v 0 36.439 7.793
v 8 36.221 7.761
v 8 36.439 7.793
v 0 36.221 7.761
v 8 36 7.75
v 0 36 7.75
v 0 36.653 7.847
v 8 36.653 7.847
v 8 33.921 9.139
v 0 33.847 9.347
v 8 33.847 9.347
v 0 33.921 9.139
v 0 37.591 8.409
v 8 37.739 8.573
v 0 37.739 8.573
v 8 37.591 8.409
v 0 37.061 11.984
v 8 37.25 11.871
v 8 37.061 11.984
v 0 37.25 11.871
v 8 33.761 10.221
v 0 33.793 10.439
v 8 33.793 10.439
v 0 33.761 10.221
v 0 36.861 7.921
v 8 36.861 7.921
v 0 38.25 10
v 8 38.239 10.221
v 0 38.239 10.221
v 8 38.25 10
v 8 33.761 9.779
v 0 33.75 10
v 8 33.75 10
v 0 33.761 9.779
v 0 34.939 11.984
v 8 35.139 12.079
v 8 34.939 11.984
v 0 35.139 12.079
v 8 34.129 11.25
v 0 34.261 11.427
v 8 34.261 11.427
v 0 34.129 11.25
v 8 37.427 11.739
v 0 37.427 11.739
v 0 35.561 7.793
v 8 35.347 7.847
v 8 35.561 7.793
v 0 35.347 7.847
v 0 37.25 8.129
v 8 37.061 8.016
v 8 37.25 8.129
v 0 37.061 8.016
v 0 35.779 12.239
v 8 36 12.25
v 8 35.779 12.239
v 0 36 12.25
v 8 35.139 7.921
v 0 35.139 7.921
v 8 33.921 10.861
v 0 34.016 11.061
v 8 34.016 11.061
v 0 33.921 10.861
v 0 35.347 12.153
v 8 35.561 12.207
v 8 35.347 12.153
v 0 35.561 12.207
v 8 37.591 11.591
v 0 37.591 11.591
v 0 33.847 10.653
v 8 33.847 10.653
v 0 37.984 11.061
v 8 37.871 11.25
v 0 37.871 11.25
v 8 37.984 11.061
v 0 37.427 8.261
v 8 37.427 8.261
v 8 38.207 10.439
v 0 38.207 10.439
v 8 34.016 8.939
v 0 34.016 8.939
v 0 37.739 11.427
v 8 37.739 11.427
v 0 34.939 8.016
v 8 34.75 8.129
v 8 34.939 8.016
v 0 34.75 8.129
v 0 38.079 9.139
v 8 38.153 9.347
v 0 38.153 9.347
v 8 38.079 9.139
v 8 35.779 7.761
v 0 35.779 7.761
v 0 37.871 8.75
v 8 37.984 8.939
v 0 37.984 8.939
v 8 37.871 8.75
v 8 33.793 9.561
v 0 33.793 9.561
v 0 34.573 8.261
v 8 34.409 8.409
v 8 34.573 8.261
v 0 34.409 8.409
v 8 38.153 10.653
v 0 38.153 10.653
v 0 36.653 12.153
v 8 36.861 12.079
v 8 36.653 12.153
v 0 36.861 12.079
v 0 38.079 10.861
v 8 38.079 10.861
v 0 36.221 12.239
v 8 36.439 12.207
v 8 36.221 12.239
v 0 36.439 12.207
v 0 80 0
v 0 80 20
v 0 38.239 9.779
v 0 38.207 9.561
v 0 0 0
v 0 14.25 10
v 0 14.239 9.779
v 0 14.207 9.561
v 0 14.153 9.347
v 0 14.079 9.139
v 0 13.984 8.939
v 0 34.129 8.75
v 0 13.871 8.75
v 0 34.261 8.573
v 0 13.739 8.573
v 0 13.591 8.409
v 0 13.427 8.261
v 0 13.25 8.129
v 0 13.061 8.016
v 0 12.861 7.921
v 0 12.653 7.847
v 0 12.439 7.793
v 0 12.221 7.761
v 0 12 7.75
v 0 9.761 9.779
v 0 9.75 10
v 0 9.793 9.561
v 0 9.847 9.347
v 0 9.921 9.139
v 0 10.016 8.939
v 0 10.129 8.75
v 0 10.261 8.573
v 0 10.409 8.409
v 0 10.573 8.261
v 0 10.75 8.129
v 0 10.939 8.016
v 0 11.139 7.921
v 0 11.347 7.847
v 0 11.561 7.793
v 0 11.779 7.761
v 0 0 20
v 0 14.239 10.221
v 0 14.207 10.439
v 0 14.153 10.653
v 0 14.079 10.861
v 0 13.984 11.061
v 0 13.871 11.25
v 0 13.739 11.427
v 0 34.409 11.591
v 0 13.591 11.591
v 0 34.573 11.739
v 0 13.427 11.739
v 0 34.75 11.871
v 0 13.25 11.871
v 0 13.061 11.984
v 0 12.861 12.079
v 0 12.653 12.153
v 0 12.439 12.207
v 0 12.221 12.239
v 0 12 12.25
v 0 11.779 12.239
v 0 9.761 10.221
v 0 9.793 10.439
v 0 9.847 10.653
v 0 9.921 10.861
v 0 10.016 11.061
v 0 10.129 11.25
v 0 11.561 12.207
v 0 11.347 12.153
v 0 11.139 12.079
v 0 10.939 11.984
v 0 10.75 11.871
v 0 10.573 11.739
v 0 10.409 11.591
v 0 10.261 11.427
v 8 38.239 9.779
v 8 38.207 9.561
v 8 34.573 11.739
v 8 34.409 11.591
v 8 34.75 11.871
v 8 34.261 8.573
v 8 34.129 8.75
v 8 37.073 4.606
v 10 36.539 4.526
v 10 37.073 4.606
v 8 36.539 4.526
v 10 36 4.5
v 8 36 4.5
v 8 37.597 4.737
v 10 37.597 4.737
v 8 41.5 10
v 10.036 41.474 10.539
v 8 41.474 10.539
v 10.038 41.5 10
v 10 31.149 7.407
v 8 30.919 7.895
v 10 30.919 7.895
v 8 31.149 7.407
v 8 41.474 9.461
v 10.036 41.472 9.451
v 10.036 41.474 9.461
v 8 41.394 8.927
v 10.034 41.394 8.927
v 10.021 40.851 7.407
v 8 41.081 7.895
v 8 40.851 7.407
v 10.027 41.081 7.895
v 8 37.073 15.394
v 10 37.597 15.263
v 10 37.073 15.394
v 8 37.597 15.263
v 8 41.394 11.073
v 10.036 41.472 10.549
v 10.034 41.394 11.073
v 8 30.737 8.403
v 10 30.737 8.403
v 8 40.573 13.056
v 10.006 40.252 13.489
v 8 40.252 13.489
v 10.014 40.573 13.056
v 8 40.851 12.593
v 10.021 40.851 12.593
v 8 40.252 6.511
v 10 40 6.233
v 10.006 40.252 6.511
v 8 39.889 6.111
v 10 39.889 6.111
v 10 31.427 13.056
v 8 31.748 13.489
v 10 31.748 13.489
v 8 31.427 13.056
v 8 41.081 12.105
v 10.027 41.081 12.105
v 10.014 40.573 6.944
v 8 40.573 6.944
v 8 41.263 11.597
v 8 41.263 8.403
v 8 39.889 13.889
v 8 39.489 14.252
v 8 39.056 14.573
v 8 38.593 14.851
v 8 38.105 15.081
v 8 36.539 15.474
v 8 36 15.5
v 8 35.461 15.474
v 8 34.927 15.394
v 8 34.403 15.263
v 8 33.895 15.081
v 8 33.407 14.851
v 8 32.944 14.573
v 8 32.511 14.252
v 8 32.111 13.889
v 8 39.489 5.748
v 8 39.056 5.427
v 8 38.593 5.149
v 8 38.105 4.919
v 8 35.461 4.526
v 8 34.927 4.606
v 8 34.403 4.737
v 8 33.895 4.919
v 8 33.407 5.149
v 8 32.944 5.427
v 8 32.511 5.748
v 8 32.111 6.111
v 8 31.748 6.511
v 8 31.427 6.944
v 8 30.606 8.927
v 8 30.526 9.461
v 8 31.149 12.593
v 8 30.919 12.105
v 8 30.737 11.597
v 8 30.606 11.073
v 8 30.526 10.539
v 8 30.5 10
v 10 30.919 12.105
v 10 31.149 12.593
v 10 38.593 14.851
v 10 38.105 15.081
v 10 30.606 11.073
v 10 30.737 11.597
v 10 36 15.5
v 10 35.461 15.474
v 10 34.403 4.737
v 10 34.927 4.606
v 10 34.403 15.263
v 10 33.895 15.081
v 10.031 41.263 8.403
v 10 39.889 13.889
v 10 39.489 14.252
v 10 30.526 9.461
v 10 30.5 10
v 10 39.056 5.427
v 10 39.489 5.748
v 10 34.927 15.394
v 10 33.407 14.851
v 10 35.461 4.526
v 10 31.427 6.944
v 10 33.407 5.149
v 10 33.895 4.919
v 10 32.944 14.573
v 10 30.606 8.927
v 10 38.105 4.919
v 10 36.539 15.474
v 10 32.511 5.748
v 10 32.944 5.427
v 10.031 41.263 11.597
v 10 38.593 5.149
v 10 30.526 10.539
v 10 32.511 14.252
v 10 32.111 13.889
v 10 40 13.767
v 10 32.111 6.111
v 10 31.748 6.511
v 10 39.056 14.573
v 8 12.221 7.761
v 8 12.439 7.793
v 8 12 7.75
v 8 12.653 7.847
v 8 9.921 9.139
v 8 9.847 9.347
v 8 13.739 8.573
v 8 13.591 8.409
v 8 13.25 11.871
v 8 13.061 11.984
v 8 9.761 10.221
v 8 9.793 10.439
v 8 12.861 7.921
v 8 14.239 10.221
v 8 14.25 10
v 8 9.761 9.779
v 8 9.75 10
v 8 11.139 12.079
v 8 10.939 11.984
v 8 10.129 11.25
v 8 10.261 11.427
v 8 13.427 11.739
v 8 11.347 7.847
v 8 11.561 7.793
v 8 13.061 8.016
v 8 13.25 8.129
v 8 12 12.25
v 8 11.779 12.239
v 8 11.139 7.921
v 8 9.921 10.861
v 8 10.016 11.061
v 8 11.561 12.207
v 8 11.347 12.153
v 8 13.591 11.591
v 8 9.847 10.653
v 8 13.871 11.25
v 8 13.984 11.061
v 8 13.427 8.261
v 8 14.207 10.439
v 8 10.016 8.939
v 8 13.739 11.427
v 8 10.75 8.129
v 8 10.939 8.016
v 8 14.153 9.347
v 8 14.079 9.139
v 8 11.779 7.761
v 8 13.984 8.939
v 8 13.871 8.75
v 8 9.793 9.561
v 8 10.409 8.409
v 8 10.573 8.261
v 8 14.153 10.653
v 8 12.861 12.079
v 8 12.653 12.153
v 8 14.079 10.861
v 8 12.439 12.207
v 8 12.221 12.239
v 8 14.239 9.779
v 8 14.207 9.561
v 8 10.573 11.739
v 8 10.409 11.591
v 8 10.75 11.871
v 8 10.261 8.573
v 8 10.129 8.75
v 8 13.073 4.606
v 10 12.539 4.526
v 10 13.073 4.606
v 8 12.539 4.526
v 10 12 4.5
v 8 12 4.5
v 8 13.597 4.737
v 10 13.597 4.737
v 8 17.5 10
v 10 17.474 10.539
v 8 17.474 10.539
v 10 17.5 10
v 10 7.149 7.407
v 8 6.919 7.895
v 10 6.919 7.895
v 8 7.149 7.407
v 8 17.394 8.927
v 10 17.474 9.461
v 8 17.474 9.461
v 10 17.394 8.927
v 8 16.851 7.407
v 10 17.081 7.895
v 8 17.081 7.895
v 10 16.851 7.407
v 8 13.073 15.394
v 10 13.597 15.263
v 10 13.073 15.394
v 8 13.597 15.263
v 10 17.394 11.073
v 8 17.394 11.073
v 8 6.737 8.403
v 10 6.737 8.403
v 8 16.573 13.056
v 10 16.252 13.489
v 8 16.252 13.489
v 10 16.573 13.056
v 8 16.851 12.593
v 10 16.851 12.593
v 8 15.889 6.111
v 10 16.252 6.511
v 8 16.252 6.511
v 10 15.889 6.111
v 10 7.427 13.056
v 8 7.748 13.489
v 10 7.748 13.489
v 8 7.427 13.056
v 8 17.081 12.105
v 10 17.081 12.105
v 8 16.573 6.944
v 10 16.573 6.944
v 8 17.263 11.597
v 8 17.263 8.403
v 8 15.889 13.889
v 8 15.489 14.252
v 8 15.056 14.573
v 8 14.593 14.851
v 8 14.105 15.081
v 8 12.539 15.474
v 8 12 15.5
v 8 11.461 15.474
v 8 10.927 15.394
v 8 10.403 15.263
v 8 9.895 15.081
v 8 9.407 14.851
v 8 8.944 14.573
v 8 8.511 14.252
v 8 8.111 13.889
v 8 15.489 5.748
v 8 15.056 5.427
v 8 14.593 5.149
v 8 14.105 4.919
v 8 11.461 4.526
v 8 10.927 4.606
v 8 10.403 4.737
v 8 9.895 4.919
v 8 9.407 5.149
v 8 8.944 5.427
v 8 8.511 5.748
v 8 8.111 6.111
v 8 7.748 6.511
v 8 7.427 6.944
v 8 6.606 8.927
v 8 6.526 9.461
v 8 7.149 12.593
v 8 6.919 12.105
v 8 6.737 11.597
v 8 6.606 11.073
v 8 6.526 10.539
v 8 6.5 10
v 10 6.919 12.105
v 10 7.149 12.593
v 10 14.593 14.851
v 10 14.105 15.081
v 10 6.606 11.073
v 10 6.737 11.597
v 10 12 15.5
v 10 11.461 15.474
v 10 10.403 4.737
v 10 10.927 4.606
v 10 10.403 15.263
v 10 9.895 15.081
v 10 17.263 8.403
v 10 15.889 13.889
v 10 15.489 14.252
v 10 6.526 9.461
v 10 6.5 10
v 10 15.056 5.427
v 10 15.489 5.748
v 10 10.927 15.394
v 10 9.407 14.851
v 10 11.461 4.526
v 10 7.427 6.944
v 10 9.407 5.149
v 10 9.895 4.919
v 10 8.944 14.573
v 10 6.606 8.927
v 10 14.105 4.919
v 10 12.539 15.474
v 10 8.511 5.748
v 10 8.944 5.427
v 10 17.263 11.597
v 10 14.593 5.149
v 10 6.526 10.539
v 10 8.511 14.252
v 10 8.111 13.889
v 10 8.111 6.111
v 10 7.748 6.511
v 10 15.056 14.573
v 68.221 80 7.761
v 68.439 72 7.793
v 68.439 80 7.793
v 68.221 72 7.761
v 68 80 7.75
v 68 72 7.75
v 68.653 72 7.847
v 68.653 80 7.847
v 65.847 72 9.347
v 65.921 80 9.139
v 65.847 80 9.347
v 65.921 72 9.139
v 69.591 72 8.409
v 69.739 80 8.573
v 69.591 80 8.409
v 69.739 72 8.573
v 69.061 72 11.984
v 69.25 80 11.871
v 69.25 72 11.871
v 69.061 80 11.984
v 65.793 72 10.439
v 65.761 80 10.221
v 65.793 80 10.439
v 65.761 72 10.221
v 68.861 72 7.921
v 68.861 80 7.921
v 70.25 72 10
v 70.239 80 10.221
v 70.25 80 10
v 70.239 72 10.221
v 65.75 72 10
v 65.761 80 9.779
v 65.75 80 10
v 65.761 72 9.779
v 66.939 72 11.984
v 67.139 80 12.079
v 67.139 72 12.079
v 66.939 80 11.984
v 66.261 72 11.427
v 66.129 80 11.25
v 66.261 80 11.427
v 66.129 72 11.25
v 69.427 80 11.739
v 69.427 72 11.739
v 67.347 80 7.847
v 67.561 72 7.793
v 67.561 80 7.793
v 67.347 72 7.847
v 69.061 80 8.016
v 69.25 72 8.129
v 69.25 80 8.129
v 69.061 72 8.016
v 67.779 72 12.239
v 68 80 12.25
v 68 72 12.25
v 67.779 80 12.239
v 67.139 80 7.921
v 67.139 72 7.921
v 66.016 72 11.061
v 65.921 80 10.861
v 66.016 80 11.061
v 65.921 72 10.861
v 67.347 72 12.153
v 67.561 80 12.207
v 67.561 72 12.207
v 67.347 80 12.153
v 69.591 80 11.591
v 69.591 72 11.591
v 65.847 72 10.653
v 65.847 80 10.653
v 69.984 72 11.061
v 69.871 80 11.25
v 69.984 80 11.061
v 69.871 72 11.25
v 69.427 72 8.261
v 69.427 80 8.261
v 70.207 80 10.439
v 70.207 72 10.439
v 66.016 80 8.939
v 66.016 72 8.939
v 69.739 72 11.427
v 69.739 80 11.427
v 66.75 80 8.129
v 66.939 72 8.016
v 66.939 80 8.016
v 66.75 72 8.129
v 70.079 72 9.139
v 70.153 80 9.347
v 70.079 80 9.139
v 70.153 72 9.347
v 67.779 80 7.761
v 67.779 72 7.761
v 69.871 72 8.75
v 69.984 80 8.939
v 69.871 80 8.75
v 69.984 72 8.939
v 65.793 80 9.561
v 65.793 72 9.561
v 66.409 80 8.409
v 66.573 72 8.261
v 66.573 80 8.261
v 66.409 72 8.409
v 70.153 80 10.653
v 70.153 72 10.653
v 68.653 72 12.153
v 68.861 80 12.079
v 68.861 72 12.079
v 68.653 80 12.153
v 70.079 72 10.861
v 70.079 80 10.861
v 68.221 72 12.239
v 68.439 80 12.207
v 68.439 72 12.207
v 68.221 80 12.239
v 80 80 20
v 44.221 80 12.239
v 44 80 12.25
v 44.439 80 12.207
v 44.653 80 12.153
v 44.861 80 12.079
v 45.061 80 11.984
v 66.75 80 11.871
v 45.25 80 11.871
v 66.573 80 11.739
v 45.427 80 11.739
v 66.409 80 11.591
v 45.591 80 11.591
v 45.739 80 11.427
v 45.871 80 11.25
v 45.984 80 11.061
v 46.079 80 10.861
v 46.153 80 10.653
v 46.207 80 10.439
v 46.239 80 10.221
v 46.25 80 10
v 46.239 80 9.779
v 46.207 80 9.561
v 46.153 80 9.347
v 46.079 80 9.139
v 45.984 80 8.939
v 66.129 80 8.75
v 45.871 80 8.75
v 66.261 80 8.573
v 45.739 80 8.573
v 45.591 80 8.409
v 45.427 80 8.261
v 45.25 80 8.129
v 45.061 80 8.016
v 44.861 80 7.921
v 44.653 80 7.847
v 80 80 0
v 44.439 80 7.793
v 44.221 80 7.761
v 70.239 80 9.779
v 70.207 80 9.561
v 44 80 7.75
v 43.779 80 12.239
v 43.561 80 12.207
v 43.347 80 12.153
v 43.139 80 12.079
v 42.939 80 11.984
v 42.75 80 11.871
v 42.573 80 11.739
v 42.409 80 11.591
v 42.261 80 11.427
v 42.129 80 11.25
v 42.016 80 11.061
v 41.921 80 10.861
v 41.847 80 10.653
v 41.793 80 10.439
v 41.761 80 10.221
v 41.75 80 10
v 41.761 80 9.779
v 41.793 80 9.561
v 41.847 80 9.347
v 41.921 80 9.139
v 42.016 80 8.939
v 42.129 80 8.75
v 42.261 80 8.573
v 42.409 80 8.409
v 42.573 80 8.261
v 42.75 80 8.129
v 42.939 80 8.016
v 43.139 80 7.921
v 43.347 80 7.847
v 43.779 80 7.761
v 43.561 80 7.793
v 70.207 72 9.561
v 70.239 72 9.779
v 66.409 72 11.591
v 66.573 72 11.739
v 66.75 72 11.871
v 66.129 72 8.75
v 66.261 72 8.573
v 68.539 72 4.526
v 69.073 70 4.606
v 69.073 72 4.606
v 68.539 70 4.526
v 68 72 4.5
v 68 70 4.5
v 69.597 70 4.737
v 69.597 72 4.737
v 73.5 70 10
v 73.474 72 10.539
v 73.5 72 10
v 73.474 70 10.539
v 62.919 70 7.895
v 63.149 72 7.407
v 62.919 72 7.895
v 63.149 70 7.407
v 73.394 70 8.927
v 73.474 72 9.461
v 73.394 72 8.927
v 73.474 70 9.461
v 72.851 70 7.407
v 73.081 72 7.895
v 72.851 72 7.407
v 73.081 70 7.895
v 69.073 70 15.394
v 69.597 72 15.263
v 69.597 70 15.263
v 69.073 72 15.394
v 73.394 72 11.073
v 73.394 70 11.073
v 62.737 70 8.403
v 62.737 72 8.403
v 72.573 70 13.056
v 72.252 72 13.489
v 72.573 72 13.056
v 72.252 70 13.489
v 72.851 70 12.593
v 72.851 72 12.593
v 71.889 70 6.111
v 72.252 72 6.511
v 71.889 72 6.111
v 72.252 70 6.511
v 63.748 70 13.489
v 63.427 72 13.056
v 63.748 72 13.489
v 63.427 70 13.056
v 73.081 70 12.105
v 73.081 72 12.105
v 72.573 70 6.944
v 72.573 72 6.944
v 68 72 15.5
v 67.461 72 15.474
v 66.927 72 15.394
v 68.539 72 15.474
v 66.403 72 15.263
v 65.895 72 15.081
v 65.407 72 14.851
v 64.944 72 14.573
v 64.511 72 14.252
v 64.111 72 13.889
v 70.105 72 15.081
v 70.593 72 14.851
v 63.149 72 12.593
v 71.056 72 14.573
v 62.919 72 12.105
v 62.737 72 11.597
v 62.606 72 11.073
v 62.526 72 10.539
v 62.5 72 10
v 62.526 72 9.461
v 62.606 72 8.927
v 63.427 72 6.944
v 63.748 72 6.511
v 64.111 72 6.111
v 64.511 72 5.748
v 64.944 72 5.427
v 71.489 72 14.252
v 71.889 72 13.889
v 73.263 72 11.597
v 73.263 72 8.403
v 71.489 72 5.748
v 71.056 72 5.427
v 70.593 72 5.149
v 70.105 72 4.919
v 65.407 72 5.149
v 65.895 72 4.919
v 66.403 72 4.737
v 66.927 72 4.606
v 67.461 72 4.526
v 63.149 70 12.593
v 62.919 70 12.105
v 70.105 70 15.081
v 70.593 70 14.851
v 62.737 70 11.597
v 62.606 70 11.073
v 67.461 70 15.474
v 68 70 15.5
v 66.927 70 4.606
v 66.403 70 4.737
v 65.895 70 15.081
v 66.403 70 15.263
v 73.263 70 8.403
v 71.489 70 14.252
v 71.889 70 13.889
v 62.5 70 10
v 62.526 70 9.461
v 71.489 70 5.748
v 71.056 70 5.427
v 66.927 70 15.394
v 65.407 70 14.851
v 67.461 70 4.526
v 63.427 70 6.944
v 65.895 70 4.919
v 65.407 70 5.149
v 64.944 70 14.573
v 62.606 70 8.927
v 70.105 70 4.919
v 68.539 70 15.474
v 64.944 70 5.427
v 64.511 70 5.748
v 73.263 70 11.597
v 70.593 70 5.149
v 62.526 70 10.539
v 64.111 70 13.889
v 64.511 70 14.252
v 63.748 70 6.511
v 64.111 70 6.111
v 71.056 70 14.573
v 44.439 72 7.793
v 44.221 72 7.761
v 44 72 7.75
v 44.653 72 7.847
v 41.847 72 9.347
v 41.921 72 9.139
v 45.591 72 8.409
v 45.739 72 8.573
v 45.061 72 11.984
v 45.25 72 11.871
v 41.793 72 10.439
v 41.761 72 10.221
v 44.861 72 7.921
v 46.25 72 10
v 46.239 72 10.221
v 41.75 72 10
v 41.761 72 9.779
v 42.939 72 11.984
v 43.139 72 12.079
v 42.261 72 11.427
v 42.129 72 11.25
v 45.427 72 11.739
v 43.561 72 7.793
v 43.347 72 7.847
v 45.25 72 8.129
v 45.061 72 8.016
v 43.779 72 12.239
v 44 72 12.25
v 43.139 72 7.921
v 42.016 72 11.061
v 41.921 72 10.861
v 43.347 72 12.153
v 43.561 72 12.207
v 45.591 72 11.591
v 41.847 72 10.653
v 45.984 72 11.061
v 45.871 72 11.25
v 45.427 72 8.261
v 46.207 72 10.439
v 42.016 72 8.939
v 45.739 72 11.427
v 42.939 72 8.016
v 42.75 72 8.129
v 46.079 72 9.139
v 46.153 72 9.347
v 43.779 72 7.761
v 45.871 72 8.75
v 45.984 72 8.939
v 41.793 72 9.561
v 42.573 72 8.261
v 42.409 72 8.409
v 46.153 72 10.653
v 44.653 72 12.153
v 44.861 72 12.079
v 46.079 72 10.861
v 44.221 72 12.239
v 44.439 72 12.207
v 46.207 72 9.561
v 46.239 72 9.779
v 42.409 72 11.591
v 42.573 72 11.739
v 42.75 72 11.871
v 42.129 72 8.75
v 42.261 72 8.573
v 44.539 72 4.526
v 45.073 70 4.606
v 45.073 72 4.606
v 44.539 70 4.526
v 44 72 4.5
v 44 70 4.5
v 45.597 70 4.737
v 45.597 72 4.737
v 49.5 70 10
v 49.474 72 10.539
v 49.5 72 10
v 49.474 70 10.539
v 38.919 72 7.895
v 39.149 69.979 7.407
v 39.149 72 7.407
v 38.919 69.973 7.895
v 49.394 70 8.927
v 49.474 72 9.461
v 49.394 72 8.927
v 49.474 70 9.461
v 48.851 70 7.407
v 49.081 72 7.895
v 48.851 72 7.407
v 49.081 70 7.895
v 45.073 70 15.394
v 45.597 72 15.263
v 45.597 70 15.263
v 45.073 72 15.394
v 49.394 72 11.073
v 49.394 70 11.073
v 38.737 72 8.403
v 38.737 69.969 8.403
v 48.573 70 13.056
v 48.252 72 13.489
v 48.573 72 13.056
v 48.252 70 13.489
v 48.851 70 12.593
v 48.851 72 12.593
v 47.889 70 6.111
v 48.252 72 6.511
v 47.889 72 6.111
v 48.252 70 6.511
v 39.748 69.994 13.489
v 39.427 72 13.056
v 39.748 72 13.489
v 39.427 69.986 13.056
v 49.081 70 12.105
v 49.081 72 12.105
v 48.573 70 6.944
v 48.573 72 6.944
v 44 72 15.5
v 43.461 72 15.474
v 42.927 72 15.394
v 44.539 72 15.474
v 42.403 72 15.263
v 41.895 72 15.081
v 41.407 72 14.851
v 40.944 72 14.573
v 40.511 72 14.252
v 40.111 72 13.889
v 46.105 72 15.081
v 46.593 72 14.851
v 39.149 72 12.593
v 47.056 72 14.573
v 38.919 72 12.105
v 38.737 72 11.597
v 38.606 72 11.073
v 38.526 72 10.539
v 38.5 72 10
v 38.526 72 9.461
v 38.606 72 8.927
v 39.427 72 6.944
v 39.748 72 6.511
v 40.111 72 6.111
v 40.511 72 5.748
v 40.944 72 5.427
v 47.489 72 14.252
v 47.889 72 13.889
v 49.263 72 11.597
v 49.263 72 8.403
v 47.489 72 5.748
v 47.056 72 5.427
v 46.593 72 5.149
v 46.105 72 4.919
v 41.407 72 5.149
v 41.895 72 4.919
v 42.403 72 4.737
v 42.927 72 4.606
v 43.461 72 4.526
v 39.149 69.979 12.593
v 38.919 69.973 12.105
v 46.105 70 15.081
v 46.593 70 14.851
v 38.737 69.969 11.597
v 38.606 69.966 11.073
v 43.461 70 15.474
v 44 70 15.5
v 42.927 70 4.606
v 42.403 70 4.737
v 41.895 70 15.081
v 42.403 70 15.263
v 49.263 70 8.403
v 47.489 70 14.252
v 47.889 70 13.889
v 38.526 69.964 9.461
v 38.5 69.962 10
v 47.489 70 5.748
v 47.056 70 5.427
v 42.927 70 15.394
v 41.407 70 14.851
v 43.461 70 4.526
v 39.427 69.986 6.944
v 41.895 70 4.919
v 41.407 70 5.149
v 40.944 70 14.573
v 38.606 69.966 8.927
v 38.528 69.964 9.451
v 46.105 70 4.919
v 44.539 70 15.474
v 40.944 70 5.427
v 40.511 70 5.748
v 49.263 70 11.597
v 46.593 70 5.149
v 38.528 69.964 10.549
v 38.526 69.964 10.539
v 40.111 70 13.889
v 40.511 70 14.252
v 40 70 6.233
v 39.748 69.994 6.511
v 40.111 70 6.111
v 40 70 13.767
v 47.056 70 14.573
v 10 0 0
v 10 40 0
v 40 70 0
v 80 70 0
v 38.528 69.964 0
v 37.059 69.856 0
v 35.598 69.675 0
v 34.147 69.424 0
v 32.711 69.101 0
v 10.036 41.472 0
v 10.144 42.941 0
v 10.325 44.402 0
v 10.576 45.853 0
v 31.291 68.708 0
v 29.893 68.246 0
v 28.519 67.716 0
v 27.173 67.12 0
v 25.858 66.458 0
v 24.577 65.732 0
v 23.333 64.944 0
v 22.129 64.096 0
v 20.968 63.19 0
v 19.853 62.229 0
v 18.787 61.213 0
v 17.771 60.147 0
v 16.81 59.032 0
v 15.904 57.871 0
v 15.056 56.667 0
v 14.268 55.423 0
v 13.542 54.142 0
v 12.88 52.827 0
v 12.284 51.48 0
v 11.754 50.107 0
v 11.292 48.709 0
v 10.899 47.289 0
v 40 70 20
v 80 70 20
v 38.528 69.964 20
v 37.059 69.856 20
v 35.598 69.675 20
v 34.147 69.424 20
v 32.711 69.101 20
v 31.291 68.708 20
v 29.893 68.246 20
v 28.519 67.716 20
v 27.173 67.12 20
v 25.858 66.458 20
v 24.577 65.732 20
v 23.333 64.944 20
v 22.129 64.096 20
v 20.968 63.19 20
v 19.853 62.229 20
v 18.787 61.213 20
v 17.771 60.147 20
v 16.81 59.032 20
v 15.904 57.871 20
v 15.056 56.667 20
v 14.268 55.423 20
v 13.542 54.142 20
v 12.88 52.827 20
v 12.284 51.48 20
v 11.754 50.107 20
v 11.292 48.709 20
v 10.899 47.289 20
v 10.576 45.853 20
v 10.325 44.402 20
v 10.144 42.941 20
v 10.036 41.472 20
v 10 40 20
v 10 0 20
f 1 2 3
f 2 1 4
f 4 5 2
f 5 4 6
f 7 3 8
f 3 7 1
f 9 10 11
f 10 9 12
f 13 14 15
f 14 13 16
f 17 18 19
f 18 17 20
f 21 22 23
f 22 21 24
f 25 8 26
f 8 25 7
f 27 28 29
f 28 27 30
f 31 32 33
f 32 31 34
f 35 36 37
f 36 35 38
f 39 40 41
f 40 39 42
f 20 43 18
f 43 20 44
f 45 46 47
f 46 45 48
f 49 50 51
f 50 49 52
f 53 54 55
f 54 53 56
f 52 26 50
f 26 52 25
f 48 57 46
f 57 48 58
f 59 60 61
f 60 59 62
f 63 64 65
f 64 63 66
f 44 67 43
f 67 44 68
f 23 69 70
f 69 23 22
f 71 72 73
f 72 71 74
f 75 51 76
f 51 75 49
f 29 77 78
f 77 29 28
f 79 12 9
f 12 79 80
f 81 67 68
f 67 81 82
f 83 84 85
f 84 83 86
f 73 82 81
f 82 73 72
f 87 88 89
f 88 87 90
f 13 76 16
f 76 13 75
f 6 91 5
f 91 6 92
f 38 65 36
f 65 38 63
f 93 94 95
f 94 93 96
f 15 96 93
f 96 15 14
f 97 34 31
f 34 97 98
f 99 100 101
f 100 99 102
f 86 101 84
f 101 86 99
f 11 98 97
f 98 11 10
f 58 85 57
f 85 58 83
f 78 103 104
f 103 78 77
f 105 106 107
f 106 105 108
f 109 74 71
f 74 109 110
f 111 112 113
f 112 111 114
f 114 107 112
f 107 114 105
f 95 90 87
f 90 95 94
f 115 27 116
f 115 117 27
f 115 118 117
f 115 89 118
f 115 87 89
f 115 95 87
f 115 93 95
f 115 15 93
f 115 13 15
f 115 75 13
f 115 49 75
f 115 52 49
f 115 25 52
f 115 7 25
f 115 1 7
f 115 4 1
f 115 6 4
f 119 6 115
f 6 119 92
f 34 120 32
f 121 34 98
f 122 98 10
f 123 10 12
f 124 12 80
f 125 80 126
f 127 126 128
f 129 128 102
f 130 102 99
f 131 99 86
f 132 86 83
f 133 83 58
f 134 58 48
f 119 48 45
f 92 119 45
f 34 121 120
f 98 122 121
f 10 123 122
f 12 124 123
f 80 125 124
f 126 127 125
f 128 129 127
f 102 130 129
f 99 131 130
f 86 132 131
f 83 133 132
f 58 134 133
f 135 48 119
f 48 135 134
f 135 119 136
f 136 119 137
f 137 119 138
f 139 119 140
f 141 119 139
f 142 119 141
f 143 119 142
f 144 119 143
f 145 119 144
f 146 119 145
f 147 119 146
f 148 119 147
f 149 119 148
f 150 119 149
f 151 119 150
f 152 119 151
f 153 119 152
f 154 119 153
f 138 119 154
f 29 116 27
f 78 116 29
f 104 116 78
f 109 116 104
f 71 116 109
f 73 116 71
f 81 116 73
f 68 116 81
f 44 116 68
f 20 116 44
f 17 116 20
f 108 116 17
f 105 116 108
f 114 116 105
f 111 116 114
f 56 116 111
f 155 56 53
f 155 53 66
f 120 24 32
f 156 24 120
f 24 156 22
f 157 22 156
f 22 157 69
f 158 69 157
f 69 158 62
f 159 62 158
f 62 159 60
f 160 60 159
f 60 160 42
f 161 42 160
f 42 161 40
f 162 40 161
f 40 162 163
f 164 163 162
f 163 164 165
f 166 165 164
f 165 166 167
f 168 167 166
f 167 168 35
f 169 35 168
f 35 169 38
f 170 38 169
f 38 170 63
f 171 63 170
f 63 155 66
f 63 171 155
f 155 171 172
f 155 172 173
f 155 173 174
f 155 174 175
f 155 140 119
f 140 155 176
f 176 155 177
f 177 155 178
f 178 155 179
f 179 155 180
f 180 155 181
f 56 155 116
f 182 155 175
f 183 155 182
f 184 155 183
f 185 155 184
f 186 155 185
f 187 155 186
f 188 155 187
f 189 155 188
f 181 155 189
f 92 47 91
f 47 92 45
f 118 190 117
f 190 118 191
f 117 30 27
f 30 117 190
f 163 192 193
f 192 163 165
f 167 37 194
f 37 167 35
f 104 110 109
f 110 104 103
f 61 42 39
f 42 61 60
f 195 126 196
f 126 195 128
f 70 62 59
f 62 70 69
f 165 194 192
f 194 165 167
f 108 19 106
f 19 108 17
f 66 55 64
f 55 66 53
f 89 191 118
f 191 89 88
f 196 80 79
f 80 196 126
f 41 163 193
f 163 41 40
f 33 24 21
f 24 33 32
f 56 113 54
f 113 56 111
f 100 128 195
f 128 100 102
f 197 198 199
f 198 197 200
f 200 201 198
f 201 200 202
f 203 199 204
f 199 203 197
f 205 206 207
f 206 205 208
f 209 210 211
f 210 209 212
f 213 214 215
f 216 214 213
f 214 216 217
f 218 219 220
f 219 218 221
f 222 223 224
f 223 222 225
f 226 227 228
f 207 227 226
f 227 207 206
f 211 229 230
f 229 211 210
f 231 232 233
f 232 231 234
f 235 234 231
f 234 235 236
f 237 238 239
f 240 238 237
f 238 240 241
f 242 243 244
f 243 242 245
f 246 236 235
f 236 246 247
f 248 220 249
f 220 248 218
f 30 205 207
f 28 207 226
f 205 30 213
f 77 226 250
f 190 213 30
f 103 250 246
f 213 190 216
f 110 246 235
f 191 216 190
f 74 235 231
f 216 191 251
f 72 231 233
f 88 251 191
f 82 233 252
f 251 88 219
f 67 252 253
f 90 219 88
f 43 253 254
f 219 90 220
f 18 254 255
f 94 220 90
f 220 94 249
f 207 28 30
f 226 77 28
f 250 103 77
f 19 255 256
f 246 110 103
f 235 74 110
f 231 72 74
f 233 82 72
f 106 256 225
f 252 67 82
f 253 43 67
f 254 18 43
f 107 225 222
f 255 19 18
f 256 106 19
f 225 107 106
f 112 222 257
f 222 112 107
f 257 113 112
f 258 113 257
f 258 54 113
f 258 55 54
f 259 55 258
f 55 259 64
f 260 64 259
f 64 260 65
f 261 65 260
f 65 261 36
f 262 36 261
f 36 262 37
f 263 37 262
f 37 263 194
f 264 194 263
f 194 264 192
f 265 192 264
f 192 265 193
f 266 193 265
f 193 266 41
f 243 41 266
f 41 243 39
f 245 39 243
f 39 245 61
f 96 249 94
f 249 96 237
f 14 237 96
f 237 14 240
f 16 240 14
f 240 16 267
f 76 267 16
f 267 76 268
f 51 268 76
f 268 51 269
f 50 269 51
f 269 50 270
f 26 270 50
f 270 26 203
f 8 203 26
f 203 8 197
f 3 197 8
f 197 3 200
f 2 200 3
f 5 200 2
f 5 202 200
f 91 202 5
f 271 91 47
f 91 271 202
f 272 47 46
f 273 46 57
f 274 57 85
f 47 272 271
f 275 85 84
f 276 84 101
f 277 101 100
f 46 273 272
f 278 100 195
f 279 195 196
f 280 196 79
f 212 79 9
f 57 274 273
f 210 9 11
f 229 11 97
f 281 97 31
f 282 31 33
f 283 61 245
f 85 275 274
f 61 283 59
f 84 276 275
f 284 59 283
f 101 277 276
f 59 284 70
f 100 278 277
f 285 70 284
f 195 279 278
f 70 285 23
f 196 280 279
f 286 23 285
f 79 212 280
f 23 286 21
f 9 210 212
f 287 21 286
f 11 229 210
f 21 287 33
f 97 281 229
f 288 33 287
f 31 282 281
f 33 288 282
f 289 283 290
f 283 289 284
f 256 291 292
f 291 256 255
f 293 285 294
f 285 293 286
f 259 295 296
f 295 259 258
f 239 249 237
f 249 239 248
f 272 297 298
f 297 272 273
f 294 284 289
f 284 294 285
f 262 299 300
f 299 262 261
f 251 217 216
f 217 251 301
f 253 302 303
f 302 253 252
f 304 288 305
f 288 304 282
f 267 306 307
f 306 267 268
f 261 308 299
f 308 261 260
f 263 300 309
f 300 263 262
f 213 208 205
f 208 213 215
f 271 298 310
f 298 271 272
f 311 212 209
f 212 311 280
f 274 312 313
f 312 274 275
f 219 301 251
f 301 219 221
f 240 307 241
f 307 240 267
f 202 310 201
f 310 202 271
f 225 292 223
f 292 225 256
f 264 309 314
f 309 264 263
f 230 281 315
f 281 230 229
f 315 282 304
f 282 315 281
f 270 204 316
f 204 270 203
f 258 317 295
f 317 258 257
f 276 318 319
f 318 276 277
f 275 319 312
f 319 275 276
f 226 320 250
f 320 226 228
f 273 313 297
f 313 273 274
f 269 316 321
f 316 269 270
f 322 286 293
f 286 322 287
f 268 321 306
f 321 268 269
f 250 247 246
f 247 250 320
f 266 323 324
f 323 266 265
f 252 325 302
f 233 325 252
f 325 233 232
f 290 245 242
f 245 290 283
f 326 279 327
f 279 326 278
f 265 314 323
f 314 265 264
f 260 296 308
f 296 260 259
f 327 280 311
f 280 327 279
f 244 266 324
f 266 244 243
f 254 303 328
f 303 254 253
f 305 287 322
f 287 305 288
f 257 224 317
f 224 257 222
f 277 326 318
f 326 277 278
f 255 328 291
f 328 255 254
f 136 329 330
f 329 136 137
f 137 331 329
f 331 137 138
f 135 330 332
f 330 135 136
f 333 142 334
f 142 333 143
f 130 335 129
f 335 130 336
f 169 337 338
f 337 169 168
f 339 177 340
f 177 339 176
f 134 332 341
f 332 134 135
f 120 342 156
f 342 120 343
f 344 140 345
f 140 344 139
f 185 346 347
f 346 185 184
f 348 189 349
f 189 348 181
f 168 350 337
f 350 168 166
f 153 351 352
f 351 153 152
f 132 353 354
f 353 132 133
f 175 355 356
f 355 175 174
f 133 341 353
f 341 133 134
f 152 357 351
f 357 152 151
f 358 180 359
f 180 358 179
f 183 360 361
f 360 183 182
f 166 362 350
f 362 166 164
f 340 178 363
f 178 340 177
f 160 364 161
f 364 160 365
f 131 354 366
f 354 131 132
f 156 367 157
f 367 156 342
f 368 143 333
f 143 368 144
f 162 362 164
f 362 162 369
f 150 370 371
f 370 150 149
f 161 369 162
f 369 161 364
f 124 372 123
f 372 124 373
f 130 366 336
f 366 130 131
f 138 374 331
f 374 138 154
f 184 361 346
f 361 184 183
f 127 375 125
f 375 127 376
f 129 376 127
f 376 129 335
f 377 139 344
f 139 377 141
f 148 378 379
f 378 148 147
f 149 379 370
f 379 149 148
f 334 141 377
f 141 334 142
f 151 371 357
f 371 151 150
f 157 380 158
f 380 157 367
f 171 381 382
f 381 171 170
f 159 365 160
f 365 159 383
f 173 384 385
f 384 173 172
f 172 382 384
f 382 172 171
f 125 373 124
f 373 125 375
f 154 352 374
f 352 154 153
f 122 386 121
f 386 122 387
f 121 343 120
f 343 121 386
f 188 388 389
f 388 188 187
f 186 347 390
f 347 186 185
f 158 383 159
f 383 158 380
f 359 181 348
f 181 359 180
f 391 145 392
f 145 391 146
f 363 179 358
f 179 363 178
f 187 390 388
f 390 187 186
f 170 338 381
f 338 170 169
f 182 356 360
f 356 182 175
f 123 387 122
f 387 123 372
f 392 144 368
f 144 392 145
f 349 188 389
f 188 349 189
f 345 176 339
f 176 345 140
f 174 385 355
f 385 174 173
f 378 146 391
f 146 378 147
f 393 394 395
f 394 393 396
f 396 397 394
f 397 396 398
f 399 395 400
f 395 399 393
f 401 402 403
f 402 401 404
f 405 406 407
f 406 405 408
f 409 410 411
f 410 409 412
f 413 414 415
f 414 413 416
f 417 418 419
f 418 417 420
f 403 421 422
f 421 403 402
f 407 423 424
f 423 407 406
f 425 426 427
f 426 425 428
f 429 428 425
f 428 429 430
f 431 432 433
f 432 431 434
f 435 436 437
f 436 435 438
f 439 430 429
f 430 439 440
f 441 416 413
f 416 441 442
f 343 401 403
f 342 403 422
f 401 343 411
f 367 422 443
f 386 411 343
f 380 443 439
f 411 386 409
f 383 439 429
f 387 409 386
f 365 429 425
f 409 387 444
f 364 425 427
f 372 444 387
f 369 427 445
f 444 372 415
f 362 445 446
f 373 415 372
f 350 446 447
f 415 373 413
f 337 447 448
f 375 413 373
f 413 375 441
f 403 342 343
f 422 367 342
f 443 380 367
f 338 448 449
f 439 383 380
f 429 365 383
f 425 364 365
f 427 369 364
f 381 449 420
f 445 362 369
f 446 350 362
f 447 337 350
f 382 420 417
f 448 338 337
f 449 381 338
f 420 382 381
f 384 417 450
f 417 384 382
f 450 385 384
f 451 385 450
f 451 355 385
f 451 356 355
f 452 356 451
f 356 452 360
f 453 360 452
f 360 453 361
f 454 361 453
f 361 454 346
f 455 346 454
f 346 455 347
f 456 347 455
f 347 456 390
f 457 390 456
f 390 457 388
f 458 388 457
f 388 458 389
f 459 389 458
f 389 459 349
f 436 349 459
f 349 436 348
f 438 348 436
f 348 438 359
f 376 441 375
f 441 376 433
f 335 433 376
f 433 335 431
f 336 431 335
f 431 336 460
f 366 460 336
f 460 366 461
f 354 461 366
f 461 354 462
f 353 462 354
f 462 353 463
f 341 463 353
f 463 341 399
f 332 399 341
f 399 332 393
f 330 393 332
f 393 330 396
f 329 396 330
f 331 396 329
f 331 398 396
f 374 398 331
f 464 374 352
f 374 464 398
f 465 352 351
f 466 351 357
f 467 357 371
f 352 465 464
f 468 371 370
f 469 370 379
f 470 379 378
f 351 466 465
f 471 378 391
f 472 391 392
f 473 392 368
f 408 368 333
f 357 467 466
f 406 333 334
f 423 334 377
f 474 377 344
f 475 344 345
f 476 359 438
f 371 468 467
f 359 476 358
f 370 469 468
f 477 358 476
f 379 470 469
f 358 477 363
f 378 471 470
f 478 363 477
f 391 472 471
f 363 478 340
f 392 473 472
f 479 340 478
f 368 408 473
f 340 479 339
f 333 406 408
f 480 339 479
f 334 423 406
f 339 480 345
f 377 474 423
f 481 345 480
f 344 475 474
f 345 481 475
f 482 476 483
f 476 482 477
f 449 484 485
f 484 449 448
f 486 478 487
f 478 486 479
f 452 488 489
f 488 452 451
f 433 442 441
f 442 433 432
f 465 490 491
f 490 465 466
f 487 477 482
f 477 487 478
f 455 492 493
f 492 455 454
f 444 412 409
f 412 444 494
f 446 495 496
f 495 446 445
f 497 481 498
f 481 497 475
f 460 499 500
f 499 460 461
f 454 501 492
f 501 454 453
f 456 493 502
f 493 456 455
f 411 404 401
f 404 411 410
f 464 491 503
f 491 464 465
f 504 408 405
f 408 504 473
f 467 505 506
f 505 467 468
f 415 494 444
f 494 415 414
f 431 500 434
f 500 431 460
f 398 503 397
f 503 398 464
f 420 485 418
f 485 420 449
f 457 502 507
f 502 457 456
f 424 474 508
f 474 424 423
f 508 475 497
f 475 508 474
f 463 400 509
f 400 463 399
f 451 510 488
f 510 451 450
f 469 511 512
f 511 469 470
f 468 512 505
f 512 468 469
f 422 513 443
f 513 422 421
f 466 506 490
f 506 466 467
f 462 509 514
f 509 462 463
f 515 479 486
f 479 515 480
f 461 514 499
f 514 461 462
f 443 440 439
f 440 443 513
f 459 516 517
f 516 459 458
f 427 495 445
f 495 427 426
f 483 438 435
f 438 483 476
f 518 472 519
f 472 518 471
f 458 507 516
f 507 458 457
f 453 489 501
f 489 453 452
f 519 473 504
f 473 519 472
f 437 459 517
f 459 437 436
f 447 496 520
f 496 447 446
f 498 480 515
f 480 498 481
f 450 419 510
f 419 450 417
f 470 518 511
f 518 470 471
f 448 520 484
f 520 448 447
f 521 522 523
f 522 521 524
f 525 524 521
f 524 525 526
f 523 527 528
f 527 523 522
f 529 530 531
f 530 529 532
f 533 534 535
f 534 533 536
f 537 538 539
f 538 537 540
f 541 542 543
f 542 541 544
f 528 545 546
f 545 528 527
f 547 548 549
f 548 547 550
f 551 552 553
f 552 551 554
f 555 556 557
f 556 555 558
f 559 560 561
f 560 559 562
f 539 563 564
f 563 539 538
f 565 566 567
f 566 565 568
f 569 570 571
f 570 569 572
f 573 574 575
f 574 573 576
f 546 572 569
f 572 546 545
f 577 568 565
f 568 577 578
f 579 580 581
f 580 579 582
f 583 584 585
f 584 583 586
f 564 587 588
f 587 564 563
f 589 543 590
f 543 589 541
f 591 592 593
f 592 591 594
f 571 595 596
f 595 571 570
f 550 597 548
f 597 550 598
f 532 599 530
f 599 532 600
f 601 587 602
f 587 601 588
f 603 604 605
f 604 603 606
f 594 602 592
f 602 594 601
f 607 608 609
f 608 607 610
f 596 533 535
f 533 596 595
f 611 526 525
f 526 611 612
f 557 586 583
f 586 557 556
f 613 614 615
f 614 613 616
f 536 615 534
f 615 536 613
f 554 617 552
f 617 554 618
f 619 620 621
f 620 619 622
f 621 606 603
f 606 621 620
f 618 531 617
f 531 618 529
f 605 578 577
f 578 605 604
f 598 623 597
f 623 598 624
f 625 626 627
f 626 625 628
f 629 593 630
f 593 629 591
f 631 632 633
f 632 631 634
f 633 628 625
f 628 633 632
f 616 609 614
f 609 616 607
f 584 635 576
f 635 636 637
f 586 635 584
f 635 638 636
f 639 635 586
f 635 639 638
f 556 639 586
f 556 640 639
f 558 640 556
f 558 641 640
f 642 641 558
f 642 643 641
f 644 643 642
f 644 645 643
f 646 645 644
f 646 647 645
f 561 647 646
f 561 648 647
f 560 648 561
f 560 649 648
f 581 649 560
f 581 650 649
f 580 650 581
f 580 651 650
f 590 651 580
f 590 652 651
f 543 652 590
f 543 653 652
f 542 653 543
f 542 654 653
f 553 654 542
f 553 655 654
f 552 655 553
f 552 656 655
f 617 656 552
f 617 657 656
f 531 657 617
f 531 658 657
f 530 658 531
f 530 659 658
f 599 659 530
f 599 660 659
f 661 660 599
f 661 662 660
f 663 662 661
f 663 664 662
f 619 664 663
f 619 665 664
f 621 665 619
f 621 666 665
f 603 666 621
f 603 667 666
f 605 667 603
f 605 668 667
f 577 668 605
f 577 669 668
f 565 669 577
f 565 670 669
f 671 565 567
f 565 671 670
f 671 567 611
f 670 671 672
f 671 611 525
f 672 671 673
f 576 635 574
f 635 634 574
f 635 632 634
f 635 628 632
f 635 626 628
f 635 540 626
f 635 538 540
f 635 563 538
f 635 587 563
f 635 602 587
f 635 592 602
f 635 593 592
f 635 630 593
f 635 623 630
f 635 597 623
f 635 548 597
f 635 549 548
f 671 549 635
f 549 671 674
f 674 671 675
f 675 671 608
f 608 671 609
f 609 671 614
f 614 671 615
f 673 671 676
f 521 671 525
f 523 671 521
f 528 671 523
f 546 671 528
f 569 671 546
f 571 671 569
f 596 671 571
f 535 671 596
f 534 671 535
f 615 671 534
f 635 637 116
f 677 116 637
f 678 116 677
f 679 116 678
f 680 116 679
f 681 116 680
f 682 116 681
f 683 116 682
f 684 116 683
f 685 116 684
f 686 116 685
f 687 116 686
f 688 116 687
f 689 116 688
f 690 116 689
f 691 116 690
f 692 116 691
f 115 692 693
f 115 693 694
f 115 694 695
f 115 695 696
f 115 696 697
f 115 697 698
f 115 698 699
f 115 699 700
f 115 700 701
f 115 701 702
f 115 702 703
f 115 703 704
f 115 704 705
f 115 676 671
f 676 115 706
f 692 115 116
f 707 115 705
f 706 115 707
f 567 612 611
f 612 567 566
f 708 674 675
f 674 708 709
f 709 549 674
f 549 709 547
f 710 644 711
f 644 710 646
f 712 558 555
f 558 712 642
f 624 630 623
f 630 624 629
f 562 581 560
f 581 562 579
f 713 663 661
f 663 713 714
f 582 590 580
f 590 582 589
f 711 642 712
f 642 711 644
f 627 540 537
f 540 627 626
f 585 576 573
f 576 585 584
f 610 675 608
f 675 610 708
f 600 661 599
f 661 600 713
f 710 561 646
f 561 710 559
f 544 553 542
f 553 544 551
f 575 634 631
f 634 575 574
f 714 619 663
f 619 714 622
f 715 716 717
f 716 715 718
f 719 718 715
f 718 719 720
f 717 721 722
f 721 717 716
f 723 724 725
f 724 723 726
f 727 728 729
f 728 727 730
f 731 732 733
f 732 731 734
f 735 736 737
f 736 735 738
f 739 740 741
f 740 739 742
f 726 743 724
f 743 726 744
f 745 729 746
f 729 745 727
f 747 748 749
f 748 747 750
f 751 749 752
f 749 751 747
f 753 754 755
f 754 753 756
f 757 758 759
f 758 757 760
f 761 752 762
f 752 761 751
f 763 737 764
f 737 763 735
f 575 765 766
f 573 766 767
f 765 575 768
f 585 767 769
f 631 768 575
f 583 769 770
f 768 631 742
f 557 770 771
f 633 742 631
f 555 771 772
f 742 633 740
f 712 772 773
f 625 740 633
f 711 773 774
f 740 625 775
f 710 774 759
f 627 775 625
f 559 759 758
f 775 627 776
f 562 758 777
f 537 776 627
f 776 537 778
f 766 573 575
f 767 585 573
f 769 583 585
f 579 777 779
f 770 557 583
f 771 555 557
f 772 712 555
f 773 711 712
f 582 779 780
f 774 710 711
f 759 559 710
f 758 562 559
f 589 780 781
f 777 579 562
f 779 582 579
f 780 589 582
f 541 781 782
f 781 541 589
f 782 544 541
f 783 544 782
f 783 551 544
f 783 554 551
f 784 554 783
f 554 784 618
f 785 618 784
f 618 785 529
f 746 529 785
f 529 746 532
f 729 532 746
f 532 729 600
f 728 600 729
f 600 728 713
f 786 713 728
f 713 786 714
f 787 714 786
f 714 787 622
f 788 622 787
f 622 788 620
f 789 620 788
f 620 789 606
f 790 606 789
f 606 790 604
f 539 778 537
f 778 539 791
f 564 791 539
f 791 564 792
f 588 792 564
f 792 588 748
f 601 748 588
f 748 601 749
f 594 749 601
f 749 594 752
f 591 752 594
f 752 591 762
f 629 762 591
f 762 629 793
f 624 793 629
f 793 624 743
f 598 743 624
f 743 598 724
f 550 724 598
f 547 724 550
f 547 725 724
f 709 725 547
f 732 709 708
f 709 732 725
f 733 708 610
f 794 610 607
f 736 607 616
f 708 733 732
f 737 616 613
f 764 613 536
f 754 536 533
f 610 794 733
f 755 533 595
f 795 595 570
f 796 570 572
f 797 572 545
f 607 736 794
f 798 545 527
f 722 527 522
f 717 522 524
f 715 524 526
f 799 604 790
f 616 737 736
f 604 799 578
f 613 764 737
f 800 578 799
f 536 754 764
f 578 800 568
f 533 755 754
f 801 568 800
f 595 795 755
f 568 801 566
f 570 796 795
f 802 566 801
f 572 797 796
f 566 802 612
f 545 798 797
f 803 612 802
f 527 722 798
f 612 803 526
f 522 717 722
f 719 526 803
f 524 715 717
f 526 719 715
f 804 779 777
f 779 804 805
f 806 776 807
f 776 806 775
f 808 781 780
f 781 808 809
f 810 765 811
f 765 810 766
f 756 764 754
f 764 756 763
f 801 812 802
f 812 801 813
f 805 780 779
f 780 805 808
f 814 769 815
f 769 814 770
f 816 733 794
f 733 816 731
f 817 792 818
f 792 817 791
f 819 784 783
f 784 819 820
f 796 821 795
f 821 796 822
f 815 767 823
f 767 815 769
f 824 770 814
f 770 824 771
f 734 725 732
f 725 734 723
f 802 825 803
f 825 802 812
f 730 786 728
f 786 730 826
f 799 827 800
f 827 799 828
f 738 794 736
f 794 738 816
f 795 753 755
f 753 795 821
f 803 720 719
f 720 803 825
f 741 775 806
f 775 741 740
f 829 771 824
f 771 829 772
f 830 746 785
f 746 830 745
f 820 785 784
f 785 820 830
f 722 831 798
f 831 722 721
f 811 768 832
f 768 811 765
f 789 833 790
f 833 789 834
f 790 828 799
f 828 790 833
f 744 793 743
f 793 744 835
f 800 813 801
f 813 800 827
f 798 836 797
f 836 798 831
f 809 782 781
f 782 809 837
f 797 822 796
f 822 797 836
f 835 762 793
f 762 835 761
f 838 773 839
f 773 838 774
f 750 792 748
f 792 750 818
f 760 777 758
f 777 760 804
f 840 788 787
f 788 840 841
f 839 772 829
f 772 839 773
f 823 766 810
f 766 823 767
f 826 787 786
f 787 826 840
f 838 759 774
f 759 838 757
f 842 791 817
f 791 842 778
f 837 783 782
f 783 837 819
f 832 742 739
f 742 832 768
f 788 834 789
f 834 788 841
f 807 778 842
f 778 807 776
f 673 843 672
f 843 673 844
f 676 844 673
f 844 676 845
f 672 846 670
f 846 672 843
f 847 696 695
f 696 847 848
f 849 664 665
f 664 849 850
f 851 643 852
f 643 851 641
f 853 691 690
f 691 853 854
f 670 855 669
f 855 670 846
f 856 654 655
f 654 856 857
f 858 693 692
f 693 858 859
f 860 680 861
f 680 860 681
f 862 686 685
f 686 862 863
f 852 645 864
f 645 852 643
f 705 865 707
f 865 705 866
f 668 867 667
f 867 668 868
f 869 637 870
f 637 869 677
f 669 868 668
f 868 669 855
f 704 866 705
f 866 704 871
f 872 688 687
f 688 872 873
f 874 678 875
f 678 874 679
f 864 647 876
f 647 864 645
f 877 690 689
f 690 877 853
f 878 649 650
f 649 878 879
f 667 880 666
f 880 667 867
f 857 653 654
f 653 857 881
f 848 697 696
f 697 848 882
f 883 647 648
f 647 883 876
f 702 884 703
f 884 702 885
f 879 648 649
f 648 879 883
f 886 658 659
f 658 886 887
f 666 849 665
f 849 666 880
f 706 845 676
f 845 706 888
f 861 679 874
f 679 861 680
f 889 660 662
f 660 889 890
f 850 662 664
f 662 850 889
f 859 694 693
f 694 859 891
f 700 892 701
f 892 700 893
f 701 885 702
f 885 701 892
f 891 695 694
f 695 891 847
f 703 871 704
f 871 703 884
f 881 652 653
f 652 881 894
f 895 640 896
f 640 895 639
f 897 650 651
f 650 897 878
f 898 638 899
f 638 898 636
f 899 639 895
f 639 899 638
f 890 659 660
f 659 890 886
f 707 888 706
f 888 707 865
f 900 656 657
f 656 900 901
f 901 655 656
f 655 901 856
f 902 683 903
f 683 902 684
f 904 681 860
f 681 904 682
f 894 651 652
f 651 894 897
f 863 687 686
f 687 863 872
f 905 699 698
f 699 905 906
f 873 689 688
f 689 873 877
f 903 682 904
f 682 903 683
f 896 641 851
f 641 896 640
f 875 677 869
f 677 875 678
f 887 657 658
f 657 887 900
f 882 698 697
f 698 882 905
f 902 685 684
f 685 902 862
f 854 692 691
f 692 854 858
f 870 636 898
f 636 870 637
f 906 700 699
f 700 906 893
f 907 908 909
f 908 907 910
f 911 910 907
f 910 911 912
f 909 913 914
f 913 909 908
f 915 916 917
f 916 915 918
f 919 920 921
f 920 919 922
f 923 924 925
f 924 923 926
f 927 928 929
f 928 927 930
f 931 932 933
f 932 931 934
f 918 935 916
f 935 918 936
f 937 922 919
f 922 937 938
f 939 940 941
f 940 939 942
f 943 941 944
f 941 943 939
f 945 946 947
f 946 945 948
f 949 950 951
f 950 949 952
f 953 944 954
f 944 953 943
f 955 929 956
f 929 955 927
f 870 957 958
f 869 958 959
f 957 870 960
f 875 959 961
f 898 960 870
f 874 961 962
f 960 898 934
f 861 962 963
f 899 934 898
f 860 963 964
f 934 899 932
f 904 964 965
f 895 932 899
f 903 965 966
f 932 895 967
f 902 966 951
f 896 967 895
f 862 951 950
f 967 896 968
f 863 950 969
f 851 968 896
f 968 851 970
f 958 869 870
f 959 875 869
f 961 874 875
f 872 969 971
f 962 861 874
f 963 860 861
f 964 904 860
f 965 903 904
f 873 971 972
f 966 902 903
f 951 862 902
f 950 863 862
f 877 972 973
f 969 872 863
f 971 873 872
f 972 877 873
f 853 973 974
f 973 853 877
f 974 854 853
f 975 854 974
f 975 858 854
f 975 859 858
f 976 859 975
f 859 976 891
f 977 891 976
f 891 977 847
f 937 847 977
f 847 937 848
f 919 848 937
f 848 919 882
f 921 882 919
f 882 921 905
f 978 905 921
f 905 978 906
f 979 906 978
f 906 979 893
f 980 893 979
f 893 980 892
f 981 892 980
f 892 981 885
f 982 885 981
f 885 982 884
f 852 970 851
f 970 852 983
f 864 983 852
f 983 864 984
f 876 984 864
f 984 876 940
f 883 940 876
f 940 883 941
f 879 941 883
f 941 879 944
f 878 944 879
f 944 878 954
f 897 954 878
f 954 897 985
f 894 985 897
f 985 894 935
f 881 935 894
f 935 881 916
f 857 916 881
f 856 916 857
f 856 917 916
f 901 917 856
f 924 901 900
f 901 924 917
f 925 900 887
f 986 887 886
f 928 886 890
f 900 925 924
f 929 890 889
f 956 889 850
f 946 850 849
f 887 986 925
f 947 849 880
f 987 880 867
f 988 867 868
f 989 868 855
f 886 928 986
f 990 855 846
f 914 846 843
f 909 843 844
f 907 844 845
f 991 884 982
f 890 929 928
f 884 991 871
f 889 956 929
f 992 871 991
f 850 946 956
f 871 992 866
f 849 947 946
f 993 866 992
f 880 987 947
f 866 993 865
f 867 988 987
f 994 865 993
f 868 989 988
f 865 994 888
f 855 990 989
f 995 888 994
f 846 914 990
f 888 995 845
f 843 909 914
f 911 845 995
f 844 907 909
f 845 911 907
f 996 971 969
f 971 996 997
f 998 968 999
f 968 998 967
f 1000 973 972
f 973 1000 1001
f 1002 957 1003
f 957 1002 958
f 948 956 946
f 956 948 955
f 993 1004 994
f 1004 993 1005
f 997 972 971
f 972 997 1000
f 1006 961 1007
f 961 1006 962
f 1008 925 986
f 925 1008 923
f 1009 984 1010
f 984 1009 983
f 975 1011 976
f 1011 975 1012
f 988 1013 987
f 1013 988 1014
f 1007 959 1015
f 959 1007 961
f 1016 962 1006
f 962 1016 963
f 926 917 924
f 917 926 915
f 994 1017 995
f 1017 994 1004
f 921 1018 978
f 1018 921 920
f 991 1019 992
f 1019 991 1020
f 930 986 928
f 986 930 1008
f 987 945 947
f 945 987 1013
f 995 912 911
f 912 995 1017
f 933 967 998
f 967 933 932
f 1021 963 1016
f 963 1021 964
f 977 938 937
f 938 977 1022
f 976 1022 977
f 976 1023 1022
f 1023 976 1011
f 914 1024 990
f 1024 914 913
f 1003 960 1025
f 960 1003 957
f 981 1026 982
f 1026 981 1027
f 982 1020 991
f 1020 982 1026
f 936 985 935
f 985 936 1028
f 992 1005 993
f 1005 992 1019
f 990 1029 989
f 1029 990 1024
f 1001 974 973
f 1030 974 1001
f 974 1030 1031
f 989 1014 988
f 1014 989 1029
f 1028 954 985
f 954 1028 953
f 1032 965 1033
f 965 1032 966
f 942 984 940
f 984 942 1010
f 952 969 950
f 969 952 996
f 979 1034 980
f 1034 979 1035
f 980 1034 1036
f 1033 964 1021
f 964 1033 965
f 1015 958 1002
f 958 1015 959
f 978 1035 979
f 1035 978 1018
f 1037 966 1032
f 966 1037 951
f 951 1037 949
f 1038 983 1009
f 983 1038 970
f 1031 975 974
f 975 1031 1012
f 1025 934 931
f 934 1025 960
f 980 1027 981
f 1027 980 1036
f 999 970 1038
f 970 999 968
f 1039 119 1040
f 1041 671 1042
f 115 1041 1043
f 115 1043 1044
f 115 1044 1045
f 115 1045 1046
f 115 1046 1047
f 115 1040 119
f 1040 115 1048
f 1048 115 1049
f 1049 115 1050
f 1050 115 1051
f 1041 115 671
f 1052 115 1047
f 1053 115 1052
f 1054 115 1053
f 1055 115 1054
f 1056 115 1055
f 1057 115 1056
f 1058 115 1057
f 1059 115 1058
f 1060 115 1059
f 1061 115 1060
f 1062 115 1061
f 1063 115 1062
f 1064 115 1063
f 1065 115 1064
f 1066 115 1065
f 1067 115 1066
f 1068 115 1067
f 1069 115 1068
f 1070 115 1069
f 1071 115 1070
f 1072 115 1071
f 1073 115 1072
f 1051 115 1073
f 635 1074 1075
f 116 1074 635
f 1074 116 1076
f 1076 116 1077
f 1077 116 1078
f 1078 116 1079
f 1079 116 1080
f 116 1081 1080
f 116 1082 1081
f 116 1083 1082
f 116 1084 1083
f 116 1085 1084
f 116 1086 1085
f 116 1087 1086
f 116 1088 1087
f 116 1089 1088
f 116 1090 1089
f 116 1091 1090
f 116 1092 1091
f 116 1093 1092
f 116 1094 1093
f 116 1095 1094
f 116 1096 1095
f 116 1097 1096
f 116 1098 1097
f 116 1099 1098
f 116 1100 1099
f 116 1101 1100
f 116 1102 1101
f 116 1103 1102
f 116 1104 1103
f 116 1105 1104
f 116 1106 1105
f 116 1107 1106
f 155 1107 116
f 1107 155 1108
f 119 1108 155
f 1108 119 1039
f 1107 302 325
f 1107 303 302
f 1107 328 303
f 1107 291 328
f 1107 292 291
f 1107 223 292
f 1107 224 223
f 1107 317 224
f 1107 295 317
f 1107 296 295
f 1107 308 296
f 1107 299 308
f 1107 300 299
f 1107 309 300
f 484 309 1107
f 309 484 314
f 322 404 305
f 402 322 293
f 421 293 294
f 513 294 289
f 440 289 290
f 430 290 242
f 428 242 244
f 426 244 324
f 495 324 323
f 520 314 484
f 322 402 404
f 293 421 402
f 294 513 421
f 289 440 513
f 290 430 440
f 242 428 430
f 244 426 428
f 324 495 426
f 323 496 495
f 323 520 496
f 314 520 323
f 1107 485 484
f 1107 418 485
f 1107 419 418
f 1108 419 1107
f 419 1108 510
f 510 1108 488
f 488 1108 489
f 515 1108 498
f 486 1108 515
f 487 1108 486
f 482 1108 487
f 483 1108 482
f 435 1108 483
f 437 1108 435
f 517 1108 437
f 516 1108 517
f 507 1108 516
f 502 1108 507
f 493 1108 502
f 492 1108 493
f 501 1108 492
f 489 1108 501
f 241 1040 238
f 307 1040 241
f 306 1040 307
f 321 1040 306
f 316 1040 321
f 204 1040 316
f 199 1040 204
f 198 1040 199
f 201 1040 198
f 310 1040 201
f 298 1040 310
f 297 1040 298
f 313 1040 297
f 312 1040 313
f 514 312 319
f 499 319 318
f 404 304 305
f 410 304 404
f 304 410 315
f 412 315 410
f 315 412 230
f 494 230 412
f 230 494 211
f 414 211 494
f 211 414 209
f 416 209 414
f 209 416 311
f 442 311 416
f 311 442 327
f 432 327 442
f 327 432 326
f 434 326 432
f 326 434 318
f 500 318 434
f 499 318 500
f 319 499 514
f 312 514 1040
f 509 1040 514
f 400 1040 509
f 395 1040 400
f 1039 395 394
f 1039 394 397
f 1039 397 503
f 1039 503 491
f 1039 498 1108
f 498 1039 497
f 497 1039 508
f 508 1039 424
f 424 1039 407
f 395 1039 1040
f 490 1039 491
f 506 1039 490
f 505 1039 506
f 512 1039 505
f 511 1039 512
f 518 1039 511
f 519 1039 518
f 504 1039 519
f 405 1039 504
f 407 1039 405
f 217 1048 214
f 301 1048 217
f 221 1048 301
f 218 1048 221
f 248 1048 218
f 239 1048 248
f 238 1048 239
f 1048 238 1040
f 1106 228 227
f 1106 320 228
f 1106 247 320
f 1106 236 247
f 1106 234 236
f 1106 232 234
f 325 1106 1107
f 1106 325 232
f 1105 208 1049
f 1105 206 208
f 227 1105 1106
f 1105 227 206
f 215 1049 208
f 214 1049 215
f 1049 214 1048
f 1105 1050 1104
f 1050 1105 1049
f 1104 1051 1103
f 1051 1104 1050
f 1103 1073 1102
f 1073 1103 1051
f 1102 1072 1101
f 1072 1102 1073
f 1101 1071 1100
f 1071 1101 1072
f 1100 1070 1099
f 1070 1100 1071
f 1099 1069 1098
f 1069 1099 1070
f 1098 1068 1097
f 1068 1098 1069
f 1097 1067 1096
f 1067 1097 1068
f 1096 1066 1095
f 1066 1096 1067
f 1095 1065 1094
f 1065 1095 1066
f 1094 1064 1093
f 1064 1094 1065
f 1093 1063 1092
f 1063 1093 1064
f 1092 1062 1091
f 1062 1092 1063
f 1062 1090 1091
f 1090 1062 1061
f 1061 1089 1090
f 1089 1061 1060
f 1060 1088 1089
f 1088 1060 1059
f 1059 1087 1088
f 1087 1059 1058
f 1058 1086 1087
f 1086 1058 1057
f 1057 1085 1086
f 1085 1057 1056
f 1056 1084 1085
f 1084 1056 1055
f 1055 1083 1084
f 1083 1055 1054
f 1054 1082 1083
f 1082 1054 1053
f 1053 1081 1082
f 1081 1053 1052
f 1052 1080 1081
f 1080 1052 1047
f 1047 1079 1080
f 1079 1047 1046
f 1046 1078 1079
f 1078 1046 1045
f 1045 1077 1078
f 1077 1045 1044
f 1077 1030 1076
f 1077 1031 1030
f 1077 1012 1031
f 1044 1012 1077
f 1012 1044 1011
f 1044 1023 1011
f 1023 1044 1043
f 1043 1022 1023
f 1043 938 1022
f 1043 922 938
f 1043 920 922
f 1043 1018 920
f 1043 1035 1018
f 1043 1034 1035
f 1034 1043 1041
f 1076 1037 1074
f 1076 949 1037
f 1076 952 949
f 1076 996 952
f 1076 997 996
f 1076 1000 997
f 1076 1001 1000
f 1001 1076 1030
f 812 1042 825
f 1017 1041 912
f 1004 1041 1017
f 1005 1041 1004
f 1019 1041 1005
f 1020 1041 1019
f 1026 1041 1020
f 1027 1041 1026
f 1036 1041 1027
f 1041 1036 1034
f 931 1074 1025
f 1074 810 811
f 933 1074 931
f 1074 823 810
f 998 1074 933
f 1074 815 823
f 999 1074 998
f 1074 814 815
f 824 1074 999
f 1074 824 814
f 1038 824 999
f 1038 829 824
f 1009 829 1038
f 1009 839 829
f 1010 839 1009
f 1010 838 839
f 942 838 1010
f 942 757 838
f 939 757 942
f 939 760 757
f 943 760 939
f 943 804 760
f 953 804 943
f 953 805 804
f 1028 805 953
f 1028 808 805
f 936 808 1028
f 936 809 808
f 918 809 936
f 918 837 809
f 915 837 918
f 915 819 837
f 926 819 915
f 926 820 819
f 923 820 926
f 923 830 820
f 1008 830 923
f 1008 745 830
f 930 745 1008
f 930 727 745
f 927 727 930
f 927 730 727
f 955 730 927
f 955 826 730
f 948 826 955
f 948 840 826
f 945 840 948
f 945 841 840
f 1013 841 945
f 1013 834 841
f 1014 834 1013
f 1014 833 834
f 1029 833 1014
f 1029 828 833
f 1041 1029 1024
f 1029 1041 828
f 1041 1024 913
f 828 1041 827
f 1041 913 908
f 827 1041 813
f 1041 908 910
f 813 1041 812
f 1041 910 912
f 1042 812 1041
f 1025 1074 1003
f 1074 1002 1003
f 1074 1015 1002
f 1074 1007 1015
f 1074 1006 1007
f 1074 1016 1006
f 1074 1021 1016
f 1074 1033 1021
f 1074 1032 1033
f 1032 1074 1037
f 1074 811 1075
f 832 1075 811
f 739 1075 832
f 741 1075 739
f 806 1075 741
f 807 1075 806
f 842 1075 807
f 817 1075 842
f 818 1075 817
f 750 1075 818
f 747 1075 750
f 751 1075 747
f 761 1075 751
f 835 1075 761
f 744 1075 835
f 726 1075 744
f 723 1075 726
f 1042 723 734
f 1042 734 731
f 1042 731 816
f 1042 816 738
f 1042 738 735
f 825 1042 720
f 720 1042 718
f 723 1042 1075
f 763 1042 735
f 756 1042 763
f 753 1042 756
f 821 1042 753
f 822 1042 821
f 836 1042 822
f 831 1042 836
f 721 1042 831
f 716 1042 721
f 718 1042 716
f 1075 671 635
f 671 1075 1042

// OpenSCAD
bredde=10;
lengde=80;
dybde=20;
skruehull=4.5;
skruesynk=2; // mm for skruehull, -1 for v-synk
skruesynk_d=11; // ved v-synk, normalt skruehull * 2

hylleknekt_p = [
    [0, 0],
    [0, lengde],
    [lengde, lengde],
    [lengde, lengde-bredde],
    [bredde*4, lengde-bredde],
    [bredde, lengde-bredde*4],
    [bredde, 0],
];

module skruehull(lengde, dia, synk, synk_d=0) {
    synk_d = (synk_d==0) ? dia*2 : synk_d;  
    rotate([0, 90, 0]) {
        cylinder(h=lengde, d=dia);
        if (synk == -1) {
            translate([0, 0, lengde-dia]) {
                cylinder(h=dia, d1=dia, d2=synk_d);
            }
        } else {
            translate([0, 0, lengde-synk]) {
                cylinder(h=dia, d=synk_d);
            }        
        }
    }
}

difference() {
    linear_extrude(dybde) {

        difference() {
            polygon(hylleknekt_p);
            translate([bredde*4,lengde-bredde*4]) {
                circle(r=bredde*3, $fn=128);
            }
        }
    }
    translate([0, lengde*.45, dybde/2]) {
        skruehull(bredde, skruehull, skruesynk, skruesynk_d, $fn=64);
    }
    translate([0, lengde*.15, dybde/2]) {
        skruehull(bredde, skruehull, skruesynk, skruesynk_d, $fn=64);
    }
    translate([lengde*.85, lengde, dybde/2]) {
        rotate([0,0,270]) {
            skruehull(bredde, skruehull, skruesynk, skruesynk_d, $fn=64);
        }
    }
    translate([lengde*.55, lengde, dybde/2]) {
        rotate([0,0,270]) {
            skruehull(bredde, skruehull, skruesynk, skruesynk_d, $fn=64);
        }
    }
}
